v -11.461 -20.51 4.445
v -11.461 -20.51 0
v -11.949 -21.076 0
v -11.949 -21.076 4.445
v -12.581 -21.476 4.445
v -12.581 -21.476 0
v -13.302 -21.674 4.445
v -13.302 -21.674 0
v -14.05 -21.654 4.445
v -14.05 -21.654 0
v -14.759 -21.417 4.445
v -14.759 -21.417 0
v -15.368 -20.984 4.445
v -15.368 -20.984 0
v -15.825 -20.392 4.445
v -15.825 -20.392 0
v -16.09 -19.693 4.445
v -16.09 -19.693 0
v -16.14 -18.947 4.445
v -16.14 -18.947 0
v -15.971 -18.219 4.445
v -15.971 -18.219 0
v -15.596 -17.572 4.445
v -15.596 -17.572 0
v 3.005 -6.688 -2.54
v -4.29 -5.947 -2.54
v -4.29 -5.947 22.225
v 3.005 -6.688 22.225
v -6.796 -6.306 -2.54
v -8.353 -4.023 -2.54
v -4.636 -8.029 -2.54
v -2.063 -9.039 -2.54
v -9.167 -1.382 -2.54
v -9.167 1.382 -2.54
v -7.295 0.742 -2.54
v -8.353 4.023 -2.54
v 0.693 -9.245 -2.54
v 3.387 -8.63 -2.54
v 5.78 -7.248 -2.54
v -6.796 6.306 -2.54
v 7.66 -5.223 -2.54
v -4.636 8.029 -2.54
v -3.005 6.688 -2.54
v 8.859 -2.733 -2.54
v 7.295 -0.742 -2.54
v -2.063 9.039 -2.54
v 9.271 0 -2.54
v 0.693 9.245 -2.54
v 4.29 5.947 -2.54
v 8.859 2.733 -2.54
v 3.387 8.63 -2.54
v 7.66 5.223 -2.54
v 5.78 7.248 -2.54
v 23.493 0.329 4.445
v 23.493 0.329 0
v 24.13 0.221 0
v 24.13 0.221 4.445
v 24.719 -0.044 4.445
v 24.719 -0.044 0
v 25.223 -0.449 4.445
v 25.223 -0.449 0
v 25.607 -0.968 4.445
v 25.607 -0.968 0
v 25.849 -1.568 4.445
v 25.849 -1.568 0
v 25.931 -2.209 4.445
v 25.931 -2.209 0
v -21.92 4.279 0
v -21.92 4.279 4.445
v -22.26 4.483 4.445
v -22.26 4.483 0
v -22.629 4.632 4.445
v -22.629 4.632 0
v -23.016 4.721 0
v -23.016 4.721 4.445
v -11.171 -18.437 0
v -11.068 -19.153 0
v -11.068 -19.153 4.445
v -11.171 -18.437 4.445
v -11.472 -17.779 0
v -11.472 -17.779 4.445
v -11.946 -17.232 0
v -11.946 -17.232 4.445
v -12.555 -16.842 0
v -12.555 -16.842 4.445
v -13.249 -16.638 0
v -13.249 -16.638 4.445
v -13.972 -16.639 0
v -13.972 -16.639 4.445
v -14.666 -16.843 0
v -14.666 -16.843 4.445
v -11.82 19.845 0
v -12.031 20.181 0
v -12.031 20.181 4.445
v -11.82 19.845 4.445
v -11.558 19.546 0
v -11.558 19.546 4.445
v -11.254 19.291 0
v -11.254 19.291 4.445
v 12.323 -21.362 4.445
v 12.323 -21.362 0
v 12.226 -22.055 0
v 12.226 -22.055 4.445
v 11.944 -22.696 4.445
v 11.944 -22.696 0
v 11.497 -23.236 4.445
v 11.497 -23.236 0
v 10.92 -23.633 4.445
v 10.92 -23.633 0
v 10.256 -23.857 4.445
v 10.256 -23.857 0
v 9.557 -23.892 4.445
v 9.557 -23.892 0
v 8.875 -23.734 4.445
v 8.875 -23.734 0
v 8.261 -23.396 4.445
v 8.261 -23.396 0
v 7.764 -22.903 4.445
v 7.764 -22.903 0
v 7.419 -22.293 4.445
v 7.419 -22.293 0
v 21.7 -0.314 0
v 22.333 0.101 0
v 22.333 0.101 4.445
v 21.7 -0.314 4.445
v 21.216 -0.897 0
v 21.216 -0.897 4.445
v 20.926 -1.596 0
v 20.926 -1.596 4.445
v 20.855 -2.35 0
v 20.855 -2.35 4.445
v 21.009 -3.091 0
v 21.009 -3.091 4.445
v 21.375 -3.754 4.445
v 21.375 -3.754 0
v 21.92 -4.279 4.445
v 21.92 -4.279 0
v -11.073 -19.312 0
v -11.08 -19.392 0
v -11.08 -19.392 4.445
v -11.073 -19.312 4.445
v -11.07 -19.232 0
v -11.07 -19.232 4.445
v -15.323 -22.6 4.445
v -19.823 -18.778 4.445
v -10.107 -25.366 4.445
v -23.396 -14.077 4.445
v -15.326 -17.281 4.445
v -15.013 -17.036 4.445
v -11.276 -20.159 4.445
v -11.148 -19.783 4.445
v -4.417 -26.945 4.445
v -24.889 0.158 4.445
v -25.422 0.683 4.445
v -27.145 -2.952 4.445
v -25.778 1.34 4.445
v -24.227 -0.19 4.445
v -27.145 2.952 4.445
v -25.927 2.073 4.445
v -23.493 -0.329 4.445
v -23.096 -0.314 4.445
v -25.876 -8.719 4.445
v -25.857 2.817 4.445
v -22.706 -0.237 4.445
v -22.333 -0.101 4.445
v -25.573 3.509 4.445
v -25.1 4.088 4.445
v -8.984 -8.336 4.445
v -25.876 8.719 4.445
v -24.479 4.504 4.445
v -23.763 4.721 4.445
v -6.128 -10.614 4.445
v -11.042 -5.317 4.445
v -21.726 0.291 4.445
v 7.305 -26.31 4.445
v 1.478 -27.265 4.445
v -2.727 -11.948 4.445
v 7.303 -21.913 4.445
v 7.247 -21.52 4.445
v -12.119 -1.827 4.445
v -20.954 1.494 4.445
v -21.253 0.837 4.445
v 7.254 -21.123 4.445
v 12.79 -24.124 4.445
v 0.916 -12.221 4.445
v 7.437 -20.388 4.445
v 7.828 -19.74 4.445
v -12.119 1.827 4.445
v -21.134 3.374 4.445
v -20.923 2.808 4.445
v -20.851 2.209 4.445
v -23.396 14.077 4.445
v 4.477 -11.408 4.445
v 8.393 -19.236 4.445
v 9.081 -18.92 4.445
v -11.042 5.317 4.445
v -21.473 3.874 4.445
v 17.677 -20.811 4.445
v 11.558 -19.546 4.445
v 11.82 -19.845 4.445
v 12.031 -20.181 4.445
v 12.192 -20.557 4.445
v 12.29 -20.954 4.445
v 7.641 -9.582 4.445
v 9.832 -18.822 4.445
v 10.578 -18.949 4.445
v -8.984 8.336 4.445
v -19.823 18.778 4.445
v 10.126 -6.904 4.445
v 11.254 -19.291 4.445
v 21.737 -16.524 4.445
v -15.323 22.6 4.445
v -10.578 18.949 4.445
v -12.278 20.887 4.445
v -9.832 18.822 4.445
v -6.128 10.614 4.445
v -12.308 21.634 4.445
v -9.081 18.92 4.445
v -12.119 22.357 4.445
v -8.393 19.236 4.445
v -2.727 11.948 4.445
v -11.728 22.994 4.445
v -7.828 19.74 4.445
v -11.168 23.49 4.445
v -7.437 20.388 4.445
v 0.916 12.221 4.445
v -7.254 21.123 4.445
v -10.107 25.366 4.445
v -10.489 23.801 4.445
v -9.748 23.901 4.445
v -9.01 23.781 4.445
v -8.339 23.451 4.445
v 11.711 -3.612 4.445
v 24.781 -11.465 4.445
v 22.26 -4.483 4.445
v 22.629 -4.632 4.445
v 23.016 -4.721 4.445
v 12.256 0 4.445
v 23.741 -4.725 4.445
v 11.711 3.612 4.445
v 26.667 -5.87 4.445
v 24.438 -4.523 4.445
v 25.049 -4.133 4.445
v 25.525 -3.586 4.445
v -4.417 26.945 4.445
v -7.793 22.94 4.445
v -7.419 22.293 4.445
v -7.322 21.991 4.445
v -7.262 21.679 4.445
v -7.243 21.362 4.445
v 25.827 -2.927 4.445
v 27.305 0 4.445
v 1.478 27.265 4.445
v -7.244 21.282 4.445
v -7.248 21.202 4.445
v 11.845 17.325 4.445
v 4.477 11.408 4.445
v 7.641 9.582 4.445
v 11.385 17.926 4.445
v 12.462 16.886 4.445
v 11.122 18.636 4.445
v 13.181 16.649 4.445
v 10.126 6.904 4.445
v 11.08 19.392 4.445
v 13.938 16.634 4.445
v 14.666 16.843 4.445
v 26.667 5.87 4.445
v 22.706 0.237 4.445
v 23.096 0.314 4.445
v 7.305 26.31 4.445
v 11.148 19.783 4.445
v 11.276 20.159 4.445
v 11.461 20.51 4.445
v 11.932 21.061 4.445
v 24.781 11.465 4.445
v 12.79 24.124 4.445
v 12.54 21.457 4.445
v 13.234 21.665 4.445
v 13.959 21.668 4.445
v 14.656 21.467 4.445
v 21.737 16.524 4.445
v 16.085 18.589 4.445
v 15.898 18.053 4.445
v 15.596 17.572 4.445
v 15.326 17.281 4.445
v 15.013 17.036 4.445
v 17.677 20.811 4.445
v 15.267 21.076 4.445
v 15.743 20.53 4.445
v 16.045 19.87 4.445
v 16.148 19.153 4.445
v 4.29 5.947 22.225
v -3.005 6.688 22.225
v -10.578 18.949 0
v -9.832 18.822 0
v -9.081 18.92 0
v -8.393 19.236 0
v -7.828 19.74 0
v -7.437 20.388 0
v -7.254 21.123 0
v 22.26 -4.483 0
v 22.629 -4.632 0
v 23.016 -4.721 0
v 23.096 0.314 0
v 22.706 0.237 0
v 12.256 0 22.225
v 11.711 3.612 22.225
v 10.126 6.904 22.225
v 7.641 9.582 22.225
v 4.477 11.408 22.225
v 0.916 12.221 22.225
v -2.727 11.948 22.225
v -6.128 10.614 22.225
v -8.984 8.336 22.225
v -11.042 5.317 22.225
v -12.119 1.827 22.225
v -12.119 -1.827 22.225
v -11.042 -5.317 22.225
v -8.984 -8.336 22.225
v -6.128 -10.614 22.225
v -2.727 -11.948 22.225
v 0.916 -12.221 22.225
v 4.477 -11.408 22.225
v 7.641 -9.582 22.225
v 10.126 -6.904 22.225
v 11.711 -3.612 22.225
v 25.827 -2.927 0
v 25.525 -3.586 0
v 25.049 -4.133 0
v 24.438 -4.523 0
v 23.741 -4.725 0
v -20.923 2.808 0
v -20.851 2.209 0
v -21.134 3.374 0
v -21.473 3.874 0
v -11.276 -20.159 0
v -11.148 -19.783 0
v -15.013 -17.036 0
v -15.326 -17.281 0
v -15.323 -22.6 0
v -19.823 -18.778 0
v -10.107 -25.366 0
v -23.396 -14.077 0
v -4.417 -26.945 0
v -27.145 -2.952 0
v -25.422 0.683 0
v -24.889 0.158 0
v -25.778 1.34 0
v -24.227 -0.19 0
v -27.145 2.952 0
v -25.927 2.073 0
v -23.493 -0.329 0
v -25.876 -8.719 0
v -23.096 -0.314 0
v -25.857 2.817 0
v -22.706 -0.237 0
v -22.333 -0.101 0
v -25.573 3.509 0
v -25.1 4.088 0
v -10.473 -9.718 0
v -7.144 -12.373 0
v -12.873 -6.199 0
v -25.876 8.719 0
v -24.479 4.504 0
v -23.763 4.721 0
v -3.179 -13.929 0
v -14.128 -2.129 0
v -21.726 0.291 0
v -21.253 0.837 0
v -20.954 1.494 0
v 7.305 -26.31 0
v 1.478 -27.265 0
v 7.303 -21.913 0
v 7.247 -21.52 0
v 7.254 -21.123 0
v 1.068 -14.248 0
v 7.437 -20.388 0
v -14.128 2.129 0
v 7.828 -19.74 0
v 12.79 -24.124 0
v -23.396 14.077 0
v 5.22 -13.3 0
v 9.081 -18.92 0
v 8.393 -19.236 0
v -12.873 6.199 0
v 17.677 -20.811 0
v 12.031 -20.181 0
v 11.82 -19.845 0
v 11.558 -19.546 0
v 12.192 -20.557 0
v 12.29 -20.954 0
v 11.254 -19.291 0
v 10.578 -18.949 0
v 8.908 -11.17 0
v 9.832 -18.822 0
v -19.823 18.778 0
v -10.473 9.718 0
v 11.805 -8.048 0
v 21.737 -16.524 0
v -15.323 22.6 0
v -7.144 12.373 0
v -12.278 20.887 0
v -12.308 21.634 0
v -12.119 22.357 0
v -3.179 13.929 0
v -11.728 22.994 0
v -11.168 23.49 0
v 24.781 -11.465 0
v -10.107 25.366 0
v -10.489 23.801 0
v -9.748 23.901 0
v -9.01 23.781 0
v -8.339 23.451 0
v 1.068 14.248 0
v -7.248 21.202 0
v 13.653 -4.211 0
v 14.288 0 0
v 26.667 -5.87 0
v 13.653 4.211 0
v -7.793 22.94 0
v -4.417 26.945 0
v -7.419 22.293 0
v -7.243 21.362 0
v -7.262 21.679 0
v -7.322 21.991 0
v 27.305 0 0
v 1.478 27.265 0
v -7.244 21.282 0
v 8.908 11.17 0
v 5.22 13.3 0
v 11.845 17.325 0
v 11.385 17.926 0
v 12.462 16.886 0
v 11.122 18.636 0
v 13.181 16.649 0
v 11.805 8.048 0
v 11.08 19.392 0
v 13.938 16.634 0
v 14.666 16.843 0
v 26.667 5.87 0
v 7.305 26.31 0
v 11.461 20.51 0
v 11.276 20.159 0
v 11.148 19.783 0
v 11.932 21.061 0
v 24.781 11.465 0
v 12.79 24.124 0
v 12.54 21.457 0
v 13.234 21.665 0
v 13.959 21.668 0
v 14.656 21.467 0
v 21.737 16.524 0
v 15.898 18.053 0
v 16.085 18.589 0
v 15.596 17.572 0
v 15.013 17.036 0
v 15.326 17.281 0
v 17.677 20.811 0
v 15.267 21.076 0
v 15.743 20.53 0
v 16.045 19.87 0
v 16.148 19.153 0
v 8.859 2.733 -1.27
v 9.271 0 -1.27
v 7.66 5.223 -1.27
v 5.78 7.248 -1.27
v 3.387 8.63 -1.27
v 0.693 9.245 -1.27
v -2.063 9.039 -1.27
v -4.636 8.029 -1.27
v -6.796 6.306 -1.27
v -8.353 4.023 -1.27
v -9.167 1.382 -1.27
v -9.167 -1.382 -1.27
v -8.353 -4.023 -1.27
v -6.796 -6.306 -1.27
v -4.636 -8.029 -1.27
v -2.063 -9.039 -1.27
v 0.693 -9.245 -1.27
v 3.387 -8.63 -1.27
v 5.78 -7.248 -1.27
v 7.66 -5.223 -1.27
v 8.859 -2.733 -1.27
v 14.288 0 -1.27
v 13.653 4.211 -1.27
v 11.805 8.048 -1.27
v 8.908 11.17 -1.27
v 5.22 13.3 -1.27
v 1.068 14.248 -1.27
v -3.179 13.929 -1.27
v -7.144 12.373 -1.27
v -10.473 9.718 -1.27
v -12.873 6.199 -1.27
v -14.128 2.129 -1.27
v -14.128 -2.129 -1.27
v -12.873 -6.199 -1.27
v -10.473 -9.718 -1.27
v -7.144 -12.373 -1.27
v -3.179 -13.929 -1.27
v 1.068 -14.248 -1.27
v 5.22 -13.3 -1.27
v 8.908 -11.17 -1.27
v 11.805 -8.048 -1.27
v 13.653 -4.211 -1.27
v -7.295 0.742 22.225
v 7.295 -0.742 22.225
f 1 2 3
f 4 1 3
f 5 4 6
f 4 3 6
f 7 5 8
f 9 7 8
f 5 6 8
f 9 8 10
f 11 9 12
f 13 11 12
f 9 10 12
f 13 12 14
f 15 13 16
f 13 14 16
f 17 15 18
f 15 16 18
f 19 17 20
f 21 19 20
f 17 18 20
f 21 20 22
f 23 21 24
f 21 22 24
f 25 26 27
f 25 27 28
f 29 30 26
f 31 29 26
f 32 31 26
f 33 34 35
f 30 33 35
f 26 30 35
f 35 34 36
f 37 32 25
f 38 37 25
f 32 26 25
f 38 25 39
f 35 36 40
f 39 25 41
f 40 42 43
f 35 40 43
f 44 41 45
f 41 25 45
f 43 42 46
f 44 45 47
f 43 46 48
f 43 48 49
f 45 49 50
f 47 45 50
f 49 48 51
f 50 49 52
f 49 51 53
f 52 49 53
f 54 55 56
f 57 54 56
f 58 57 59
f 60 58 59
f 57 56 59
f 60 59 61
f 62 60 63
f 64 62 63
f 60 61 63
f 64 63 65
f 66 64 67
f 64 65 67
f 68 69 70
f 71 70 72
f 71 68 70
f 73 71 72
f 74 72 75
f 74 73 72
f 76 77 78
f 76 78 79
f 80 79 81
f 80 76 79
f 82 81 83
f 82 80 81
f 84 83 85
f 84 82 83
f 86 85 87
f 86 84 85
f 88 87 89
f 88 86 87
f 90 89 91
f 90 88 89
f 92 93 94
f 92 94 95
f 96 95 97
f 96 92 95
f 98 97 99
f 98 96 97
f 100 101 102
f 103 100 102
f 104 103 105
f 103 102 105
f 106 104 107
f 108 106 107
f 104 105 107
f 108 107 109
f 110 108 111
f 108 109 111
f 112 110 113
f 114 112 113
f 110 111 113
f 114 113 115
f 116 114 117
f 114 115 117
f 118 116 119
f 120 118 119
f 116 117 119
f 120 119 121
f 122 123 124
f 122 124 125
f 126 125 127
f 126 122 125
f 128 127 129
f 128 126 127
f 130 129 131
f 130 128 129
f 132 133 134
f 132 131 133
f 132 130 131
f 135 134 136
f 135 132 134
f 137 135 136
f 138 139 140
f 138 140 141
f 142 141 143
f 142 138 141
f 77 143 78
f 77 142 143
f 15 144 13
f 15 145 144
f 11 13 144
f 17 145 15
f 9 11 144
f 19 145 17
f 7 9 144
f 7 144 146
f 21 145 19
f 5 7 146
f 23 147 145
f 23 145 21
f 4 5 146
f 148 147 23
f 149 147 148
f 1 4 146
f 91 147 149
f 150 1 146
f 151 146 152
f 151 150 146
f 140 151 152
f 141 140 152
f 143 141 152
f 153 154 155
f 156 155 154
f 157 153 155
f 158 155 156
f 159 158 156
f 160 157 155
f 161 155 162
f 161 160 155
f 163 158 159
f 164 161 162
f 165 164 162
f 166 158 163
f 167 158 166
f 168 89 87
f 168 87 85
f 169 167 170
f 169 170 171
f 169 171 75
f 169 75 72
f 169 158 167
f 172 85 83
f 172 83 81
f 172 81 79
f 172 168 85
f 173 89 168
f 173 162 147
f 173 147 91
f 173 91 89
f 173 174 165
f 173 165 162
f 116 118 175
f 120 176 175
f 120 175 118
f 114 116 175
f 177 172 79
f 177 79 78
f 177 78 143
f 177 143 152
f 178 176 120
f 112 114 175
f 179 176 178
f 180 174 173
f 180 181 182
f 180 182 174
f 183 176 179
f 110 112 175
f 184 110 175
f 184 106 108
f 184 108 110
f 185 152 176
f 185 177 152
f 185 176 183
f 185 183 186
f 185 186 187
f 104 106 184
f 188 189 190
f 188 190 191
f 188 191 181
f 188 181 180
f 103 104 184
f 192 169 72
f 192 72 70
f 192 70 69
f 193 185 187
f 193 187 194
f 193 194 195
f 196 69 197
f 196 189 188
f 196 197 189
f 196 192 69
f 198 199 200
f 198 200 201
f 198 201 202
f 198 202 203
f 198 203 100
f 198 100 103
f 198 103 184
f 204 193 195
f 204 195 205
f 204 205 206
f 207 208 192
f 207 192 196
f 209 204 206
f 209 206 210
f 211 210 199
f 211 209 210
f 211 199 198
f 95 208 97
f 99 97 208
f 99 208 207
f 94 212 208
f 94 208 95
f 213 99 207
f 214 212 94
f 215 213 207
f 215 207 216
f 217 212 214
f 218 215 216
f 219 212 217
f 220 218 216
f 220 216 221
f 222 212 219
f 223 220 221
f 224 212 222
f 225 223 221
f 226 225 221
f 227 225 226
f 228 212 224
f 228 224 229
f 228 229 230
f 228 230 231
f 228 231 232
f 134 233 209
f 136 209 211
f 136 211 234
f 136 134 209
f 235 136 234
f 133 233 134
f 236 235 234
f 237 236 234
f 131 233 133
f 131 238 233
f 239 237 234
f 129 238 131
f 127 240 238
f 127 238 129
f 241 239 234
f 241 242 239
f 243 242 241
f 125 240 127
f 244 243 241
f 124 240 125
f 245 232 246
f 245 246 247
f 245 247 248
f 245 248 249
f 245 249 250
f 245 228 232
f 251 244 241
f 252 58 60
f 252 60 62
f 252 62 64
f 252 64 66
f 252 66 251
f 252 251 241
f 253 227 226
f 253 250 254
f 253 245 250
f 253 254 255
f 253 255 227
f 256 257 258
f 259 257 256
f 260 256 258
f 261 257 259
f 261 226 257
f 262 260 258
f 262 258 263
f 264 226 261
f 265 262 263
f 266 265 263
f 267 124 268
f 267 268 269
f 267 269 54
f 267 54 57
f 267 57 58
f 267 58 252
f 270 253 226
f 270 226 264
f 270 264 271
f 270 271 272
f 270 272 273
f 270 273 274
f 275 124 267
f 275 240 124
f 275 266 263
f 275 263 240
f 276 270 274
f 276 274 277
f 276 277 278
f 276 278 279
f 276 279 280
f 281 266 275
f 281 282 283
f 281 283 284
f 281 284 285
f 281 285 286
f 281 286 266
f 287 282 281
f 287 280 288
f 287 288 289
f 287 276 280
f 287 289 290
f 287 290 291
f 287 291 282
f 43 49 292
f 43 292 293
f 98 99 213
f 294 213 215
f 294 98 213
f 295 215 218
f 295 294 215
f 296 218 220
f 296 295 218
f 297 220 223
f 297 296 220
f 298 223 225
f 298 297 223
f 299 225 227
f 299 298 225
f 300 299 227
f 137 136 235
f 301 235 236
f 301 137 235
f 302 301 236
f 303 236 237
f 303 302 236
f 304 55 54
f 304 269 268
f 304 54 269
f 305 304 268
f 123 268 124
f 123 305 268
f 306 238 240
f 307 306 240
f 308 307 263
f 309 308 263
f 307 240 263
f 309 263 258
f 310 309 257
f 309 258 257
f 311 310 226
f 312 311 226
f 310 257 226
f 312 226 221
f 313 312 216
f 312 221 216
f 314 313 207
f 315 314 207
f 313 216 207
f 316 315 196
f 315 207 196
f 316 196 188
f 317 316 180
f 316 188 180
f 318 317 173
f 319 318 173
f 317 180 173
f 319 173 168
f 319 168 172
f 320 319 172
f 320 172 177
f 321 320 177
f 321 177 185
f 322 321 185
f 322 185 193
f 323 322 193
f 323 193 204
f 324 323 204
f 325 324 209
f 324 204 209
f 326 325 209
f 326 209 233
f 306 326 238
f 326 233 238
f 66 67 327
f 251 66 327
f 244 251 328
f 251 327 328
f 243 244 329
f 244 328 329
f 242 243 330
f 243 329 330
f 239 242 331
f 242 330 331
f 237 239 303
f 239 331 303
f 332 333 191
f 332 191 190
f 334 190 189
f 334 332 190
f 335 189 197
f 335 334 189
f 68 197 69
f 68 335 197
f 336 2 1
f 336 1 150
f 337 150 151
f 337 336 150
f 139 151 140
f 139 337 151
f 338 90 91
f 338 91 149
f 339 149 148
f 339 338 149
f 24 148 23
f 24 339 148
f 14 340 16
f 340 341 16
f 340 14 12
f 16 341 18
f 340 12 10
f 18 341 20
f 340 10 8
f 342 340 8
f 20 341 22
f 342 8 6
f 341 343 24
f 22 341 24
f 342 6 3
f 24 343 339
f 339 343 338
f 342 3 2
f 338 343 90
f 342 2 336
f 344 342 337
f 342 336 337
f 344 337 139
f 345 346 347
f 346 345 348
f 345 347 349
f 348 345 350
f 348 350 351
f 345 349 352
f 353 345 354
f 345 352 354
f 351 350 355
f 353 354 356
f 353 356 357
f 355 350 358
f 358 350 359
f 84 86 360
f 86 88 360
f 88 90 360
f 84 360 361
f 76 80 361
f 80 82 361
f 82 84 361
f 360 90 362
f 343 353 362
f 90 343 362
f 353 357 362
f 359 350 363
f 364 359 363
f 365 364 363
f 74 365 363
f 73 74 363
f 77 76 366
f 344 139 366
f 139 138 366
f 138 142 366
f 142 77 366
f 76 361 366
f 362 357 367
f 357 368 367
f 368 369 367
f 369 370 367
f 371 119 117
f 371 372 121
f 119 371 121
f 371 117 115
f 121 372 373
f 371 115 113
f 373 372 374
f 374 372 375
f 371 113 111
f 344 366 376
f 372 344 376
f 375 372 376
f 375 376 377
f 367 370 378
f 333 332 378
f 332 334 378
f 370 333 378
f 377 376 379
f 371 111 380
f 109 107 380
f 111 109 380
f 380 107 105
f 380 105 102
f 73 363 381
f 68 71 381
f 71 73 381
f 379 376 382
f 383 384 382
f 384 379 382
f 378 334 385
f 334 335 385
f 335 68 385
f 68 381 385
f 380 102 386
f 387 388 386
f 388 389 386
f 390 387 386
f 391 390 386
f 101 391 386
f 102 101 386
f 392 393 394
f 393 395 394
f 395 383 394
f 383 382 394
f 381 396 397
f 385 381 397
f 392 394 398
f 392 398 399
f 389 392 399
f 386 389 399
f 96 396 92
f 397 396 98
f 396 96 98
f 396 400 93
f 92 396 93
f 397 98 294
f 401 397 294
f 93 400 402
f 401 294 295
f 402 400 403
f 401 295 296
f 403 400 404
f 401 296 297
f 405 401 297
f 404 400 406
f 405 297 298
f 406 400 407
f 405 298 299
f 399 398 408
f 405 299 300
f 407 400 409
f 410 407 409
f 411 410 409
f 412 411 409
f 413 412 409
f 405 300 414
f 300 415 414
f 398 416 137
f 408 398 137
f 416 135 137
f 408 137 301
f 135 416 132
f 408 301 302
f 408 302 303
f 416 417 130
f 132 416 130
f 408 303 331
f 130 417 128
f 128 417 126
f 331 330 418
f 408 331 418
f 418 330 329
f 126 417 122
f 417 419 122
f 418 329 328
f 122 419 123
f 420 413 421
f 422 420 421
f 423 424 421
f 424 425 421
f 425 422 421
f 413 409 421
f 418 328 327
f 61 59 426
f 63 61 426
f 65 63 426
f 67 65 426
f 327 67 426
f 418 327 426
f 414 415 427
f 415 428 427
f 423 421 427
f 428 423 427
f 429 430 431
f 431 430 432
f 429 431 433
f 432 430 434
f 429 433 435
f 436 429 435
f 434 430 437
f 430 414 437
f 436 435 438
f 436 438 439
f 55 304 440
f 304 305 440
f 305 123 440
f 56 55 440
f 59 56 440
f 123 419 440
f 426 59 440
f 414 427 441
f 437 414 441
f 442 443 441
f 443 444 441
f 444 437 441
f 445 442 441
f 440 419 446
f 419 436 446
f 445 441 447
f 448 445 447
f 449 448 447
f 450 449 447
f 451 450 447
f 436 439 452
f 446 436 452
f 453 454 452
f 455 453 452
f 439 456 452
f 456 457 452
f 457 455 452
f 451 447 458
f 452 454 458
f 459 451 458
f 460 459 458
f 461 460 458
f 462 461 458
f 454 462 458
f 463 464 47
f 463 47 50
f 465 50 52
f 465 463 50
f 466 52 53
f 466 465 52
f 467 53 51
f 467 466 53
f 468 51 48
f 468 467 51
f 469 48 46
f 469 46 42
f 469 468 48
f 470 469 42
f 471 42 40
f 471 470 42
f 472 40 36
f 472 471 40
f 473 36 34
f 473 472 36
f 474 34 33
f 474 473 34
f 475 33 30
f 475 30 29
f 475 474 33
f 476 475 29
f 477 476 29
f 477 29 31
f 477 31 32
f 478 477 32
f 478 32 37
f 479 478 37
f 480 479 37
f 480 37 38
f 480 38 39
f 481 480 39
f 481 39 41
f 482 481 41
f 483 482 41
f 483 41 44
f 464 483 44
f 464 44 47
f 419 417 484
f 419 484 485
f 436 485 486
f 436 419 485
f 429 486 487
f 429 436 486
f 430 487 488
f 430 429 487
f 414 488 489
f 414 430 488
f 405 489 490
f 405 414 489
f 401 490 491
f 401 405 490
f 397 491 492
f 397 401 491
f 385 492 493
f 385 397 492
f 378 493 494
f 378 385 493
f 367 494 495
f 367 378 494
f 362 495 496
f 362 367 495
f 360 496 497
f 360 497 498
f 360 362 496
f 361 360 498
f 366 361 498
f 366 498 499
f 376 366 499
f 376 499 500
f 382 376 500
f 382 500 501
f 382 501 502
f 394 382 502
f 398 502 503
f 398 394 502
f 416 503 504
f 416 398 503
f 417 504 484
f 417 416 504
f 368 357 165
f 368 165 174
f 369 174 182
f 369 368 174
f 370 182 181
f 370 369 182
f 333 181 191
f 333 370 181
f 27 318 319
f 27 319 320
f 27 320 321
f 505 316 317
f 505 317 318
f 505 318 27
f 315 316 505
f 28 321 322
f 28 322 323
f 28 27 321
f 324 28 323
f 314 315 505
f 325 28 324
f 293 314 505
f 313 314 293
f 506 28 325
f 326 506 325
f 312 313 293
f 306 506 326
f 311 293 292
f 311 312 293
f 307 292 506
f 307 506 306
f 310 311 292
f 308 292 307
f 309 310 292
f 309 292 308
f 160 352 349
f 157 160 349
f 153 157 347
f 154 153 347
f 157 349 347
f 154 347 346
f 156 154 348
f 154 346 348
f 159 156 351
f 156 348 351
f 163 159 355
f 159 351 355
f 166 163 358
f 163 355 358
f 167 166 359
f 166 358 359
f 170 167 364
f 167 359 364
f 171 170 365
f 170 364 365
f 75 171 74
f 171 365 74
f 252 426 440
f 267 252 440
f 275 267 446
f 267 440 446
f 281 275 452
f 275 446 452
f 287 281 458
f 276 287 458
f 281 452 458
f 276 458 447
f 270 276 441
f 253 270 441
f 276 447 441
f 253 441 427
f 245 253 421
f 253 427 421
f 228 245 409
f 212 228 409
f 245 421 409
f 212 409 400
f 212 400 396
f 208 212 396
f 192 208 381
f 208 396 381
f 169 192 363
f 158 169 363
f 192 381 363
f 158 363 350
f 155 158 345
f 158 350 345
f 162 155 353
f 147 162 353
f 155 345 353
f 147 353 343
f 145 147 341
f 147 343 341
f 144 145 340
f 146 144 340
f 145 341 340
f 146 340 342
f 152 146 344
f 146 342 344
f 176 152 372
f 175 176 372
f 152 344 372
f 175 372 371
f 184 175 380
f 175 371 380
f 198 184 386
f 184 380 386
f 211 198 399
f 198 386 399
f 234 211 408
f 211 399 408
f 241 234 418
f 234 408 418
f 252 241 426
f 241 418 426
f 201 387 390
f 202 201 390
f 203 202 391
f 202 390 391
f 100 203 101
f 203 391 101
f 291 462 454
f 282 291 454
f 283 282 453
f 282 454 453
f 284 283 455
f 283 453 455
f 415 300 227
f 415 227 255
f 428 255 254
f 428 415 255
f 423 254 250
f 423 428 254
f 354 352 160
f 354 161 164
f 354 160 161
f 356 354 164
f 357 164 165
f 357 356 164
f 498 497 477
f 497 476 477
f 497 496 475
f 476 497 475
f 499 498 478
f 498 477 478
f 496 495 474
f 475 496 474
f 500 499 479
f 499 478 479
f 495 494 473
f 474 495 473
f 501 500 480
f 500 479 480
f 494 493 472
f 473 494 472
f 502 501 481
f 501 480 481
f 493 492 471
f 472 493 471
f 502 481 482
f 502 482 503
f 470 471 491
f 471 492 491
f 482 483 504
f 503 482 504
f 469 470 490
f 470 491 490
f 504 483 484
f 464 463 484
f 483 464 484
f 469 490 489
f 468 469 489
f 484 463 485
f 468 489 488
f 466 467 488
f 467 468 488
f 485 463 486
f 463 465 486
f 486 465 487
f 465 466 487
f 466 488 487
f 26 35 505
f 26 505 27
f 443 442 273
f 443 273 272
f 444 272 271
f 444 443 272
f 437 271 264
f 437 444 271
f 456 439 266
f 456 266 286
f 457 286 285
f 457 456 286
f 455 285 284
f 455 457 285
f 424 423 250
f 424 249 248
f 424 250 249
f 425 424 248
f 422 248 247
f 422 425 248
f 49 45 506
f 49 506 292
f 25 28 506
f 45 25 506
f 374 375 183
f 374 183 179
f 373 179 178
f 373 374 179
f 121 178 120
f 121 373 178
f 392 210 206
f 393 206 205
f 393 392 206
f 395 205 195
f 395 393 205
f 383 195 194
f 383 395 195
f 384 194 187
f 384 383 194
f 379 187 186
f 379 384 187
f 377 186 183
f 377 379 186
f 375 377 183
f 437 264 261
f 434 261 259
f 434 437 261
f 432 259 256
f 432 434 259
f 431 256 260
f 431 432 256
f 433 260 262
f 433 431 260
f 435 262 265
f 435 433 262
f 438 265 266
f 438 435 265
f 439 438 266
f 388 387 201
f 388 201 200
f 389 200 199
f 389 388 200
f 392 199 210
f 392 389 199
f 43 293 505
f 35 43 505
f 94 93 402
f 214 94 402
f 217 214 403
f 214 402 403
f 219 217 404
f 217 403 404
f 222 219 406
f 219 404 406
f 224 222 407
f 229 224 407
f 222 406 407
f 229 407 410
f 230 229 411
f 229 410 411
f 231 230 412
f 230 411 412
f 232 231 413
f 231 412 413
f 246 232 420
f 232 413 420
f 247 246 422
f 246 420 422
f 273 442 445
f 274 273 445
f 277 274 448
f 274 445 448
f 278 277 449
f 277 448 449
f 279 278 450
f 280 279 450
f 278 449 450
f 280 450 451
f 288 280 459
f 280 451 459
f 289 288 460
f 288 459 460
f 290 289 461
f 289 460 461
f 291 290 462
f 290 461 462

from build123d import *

# Parameters (mm, degrees)
F0_R     = 27.305
F0_R_2   = 14.2875
F0_R_3   = 9.271
F1_DEPTH = 4.445
F2_R     = 12.2555
F3_DEPTH = 17.78
F4_DEPTH = 2.54
F5_DEPTH = 1.27
F7_DEPTH = 25.4
F8_DEPTH = 25.4


# Not quite as in the source:
# - a feature names something its author has since deleted; it is built from what else it names


with BuildPart() as f1:
    # F0 (on Top) → F1 (new body)
    with BuildSketch(Plane.XY):
        Circle(F0_R)
        with BuildLine():
            ThreePointArc((25.93093901, -2.2088452252), (25.0490643413, -4.1329607067), (23.015804848, -4.7209905953))
            ThreePointArc((23.015804848, -4.7209905953), (19.1527247884, -13.6083855831), (12.0313699631, -20.180712619))
            ThreePointArc((12.0313699631, -20.180712619), (12.2486833913, -20.753455716), (12.3225534269, -21.3615700137))
            ThreePointArc((12.3225534269, -21.3615700137), (10.2564743458, -23.856965566), (7.4194046374, -22.2927669845))
            ThreePointArc((7.4194046374, -22.2927669845), (-2.2088452252, -23.39093901), (-11.461324813, -20.5098283399))
            ThreePointArc((-11.461324813, -20.5098283399), (-15.0795624029, -21.2232896304), (-15.5964002105, -17.5717763892))
            ThreePointArc((-15.5964002105, -17.5717763892), (-21.3615700137, -9.7825534269), (-23.4926947761, -0.3291157209))
            ThreePointArc((-23.4926947761, -0.3291157209), (-25.9196891733, 2.4476393036), (-23.015804848, 4.7209905953))
            ThreePointArc((-23.015804848, 4.7209905953), (-19.1527247884, 13.6083855831), (-12.0313699631, 20.180712619))
            ThreePointArc((-12.0313699631, 20.180712619), (-10.8401267704, 23.6709289341), (-7.4194046374, 22.2927669845))
            ThreePointArc((-7.4194046374, 22.2927669845), (2.2088452252, 23.39093901), (11.461324813, 20.5098283399))
            ThreePointArc((11.461324813, 20.5098283399), (14.3148081351, 21.5925131354), (16.1483855831, 19.1527247884))
            ThreePointArc((16.1483855831, 19.1527247884), (16.0064219833, 18.3154545673), (15.5964002105, 17.5717763892))
            ThreePointArc((15.5964002105, 17.5717763892), (21.3615700137, 9.7825534269), (23.4926947761, 0.3291157209))
            ThreePointArc((23.4926947761, 0.3291157209), (25.2226130593, -0.4491378129), (25.93093901, -2.2088452252))
        make_face(mode=Mode.SUBTRACT)
        with BuildLine():
            ThreePointArc((21.9197621902, -4.2794100672), (20.8621888468, -1.9700511468), (22.3333656666, 0.1005136952))
            Line((22.3333656666, 0.1005136952), (14.6659589265, 16.843365868))
            ThreePointArc((14.6659589265, 16.843365868), (12.1372087633, 17.0821599464), (11.0796354198, 19.3915188668))
            Line((11.0796354198, 19.3915188668), (-7.2538032637, 21.1227759353))
            ThreePointArc((-7.2538032637, 21.1227759353), (-8.7249800835, 19.0522110933), (-11.2537302467, 19.2910051717))
            Line((-11.2537302467, 19.2910051717), (-21.9197621902, 4.2794100672))
            ThreePointArc((-21.9197621902, 4.2794100672), (-21.1339067637, 3.3739226642), (-20.85093901, 2.2088452252))
            ThreePointArc((-20.85093901, 2.2088452252), (-21.2534362273, 0.8367366822), (-22.3333656666, -0.1005136952))
            Line((-22.3333656666, -0.1005136952), (-14.6659589265, -16.843365868))
            ThreePointArc((-14.6659589265, -16.843365868), (-12.2362770401, -17.0152220057), (-11.0683855831, -19.1527247884))
            ThreePointArc((-11.0683855831, -19.1527247884), (-11.0711996011, -19.2722542521), (-11.0796354198, -19.3915188668))
            Line((-11.0796354198, -19.3915188668), (7.2538032637, -21.1227759353))
            ThreePointArc((7.2538032637, -21.1227759353), (8.7249800835, -19.0522110933), (11.2537302467, -19.2910051717))
            Line((11.2537302467, -19.2910051717), (21.9197621902, -4.2794100672))
        make_face()
        Circle(F0_R_2, mode=Mode.SUBTRACT)
        Circle(F0_R_2)
        Circle(F0_R_3, mode=Mode.SUBTRACT)
        Circle(F0_R_3)
        with BuildLine():
            Line((14.6659589265, 16.843365868), (22.3333656666, 0.1005136952))
            ThreePointArc((22.3333656666, 0.1005136952), (22.8995516558, 0.2831697162), (23.4926947761, 0.3291157209))
            ThreePointArc((23.4926947761, 0.3291157209), (21.3615700137, 9.7825534269), (15.5964002105, 17.5717763892))
            ThreePointArc((15.5964002105, 17.5717763892), (15.1741272585, 17.152711537), (14.6659589265, 16.843365868))
        make_face()
        with BuildLine():
            Line((-7.2538032637, 21.1227759353), (11.0796354198, 19.3915188668))
            ThreePointArc((11.0796354198, 19.3915188668), (11.2045436601, 19.9731783273), (11.461324813, 20.5098283399))
            ThreePointArc((11.461324813, 20.5098283399), (2.2088452252, 23.39093901), (-7.4194046374, 22.2927669845))
            ThreePointArc((-7.4194046374, 22.2927669845), (-7.2871578746, 21.8354909325), (-7.2425534269, 21.3615700137))
            ThreePointArc((-7.2425534269, 21.3615700137), (-7.2453674449, 21.24204055), (-7.2538032637, 21.1227759353))
        make_face()
        with BuildLine():
            Line((-21.9197621902, 4.2794100672), (-11.2537302467, 19.2910051717))
            ThreePointArc((-11.2537302467, 19.2910051717), (-11.6950079957, 19.6900086111), (-12.0313699631, 20.180712619))
            ThreePointArc((-12.0313699631, 20.180712619), (-19.1527247884, 13.6083855831), (-23.015804848, 4.7209905953))
            ThreePointArc((-23.015804848, 4.7209905953), (-22.441747564, 4.5648239176), (-21.9197621902, 4.2794100672))
        make_face()
        with BuildLine():
            ThreePointArc((-23.4926947761, -0.3291157209), (-21.3615700137, -9.7825534269), (-15.5964002105, -17.5717763892))
            ThreePointArc((-15.5964002105, -17.5717763892), (-15.1741272585, -17.152711537), (-14.6659589265, -16.843365868))
            Line((-14.6659589265, -16.843365868), (-22.3333656666, -0.1005136952))
            ThreePointArc((-22.3333656666, -0.1005136952), (-22.8995516558, -0.2831697162), (-23.4926947761, -0.3291157209))
        make_face()
        with BuildLine():
            ThreePointArc((7.4194046374, -22.2927669845), (7.2676203056, -21.7175354546), (7.2538032637, -21.1227759353))
            Line((7.2538032637, -21.1227759353), (-11.0796354198, -19.3915188668))
            ThreePointArc((-11.0796354198, -19.3915188668), (-11.2045436601, -19.9731783273), (-11.461324813, -20.5098283399))
            ThreePointArc((-11.461324813, -20.5098283399), (-2.2088452252, -23.39093901), (7.4194046374, -22.2927669845))
        make_face()
        with BuildLine():
            ThreePointArc((12.0313699631, -20.180712619), (19.1527247884, -13.6083855831), (23.015804848, -4.7209905953))
            ThreePointArc((23.015804848, -4.7209905953), (22.441747564, -4.5648239176), (21.9197621902, -4.2794100672))
            Line((21.9197621902, -4.2794100672), (11.2537302467, -19.2910051717))
            ThreePointArc((11.2537302467, -19.2910051717), (11.6950079957, -19.6900086111), (12.0313699631, -20.180712619))
        make_face()
        with BuildLine():
            ThreePointArc((-11.2537302467, 19.2910051717), (-8.7249800835, 19.0522110933), (-7.2538032637, 21.1227759353))
            Line((-7.2538032637, 21.1227759353), (-9.7825534269, 21.3615700137))
            Line((-9.7825534269, 21.3615700137), (-11.2537302467, 19.2910051717))
        make_face()
        with BuildLine():
            ThreePointArc((-20.85093901, 2.2088452252), (-21.1339067637, 3.3739226642), (-21.9197621902, 4.2794100672))
            Line((-21.9197621902, 4.2794100672), (-23.39093901, 2.2088452252))
            Line((-23.39093901, 2.2088452252), (-22.3333656666, -0.1005136952))
            ThreePointArc((-22.3333656666, -0.1005136952), (-21.2534362273, 0.8367366822), (-20.85093901, 2.2088452252))
        make_face()
        with BuildLine():
            Line((-13.6083855831, -19.1527247884), (-11.0796354198, -19.3915188668))
            ThreePointArc((-11.0796354198, -19.3915188668), (-11.0711996011, -19.2722542521), (-11.0683855831, -19.1527247884))
            ThreePointArc((-11.0683855831, -19.1527247884), (-12.2362770401, -17.0152220057), (-14.6659589265, -16.843365868))
            Line((-14.6659589265, -16.843365868), (-13.6083855831, -19.1527247884))
        make_face()
        with BuildLine():
            Line((9.7825534269, -21.3615700137), (11.2537302467, -19.2910051717))
            ThreePointArc((11.2537302467, -19.2910051717), (8.7249800835, -19.0522110933), (7.2538032637, -21.1227759353))
            Line((7.2538032637, -21.1227759353), (9.7825534269, -21.3615700137))
        make_face()
        with BuildLine():
            Line((21.9197621902, -4.2794100672), (23.39093901, -2.2088452252))
            Line((23.39093901, -2.2088452252), (22.3333656666, 0.1005136952))
            ThreePointArc((22.3333656666, 0.1005136952), (20.8621888468, -1.9700511468), (21.9197621902, -4.2794100672))
        make_face()
        with BuildLine():
            ThreePointArc((11.0796354198, 19.3915188668), (12.1372087633, 17.0821599464), (14.6659589265, 16.843365868))
            Line((14.6659589265, 16.843365868), (13.6083855831, 19.1527247884))
            Line((13.6083855831, 19.1527247884), (11.0796354198, 19.3915188668))
        make_face()
        with BuildLine():
            Line((13.6083855831, 19.1527247884), (14.6659589265, 16.843365868))
            ThreePointArc((14.6659589265, 16.843365868), (15.1741272585, 17.152711537), (15.5964002105, 17.5717763892))
            ThreePointArc((15.5964002105, 17.5717763892), (14.6237726929, 18.3891353039), (13.6083855831, 19.1527247884))
        make_face()
        with BuildLine():
            Line((11.0796354198, 19.3915188668), (13.6083855831, 19.1527247884))
            ThreePointArc((13.6083855831, 19.1527247884), (12.5532078509, 19.8603121237), (11.461324813, 20.5098283399))
            ThreePointArc((11.461324813, 20.5098283399), (11.2045436601, 19.9731783273), (11.0796354198, 19.3915188668))
        make_face()
        with BuildLine():
            Line((-9.7825534269, 21.3615700137), (-7.2538032637, 21.1227759353))
            ThreePointArc((-7.2538032637, 21.1227759353), (-7.2453674449, 21.24204055), (-7.2425534269, 21.3615700137))
            ThreePointArc((-7.2425534269, 21.3615700137), (-7.2871578746, 21.8354909325), (-7.4194046374, 22.2927669845))
            ThreePointArc((-7.4194046374, 22.2927669845), (-8.6135719804, 21.8591263032), (-9.7825534269, 21.3615700137))
        make_face()
        with BuildLine():
            Line((-11.2537302467, 19.2910051717), (-9.7825534269, 21.3615700137))
            ThreePointArc((-9.7825534269, 21.3615700137), (-10.9229309008, 20.8015529597), (-12.0313699631, 20.180712619))
            ThreePointArc((-12.0313699631, 20.180712619), (-11.6950079957, 19.6900086111), (-11.2537302467, 19.2910051717))
        make_face()
        with BuildLine():
            Line((-23.39093901, 2.2088452252), (-21.9197621902, 4.2794100672))
            ThreePointArc((-21.9197621902, 4.2794100672), (-22.441747564, 4.5648239176), (-23.015804848, 4.7209905953))
            ThreePointArc((-23.015804848, 4.7209905953), (-23.2373446733, 3.4699909992), (-23.39093901, 2.2088452252))
        make_face()
        with BuildLine():
            ThreePointArc((-23.39093901, 2.2088452252), (-23.4761387517, 0.941240836), (-23.4926947761, -0.3291157209))
            ThreePointArc((-23.4926947761, -0.3291157209), (-22.8995516558, -0.2831697162), (-22.3333656666, -0.1005136952))
            Line((-22.3333656666, -0.1005136952), (-23.39093901, 2.2088452252))
        make_face()
        with BuildLine():
            ThreePointArc((-15.5964002105, -17.5717763892), (-14.6237726929, -18.3891353039), (-13.6083855831, -19.1527247884))
            Line((-13.6083855831, -19.1527247884), (-14.6659589265, -16.843365868))
            ThreePointArc((-14.6659589265, -16.843365868), (-15.1741272585, -17.152711537), (-15.5964002105, -17.5717763892))
        make_face()
        with BuildLine():
            ThreePointArc((-11.461324813, -20.5098283399), (-11.2045436601, -19.9731783273), (-11.0796354198, -19.3915188668))
            Line((-11.0796354198, -19.3915188668), (-13.6083855831, -19.1527247884))
            ThreePointArc((-13.6083855831, -19.1527247884), (-12.5532078509, -19.8603121237), (-11.461324813, -20.5098283399))
        make_face()
        with BuildLine():
            ThreePointArc((7.4194046374, -22.2927669845), (8.6135719804, -21.8591263032), (9.7825534269, -21.3615700137))
            Line((9.7825534269, -21.3615700137), (7.2538032637, -21.1227759353))
            ThreePointArc((7.2538032637, -21.1227759353), (7.2676203056, -21.7175354546), (7.4194046374, -22.2927669845))
        make_face()
        with BuildLine():
            ThreePointArc((9.7825534269, -21.3615700137), (10.9229309008, -20.8015529597), (12.0313699631, -20.180712619))
            ThreePointArc((12.0313699631, -20.180712619), (11.6950079957, -19.6900086111), (11.2537302467, -19.2910051717))
            Line((11.2537302467, -19.2910051717), (9.7825534269, -21.3615700137))
        make_face()
        with BuildLine():
            ThreePointArc((23.015804848, -4.7209905953), (23.2373446733, -3.4699909992), (23.39093901, -2.2088452252))
            Line((23.39093901, -2.2088452252), (21.9197621902, -4.2794100672))
            ThreePointArc((21.9197621902, -4.2794100672), (22.441747564, -4.5648239176), (23.015804848, -4.7209905953))
        make_face()
        with BuildLine():
            Line((22.3333656666, 0.1005136952), (23.39093901, -2.2088452252))
            ThreePointArc((23.39093901, -2.2088452252), (23.4689703336, -1.1056475386), (23.495, 0))
            ThreePointArc((23.495, 0), (23.494423687, 0.164561897), (23.4926947761, 0.3291157209))
            ThreePointArc((23.4926947761, 0.3291157209), (22.8995516558, 0.2831697162), (22.3333656666, 0.1005136952))
        make_face()
    extrude(amount=F1_DEPTH)

    # F2 (on face) → F3 (join)
    with BuildSketch(Plane.XY.offset(4.445)):
        Circle(F2_R)
    extrude(amount=F3_DEPTH)

    # F0 (on Top) → F4 (join)
    with BuildSketch(Plane.XY):
        Circle(F0_R_3)
    extrude(amount=-F4_DEPTH)

    # F0 (on Top) → F5 (join)
    with BuildSketch(Plane.XY):
        Circle(F0_R_2)
        Circle(F0_R_3, mode=Mode.SUBTRACT)
    extrude(amount=-F5_DEPTH)

    # F6 (on face) → F7 (cut)
    with BuildSketch(Plane.XY.offset(22.225)):
        Polygon((-4.2897580502, -5.9465375811), (3.0049735847, -6.6883082382), (7.2947316349, -0.741770657), (4.2897580502, 5.9465375811), (-3.0049735847, 6.6883082382), (-7.2947316349, 0.741770657), align=None)
    extrude(amount=-F7_DEPTH, mode=Mode.SUBTRACT)

    # F0 (on Top) → F8 (cut)
    with BuildSketch(Plane.XY):
        with BuildLine():
            ThreePointArc((11.0796354198, 19.3915188668), (12.1372087633, 17.0821599464), (14.6659589265, 16.843365868))
            Line((14.6659589265, 16.843365868), (13.6083855831, 19.1527247884))
            Line((13.6083855831, 19.1527247884), (11.0796354198, 19.3915188668))
        make_face()
        with BuildLine():
            Line((13.6083855831, 19.1527247884), (14.6659589265, 16.843365868))
            ThreePointArc((14.6659589265, 16.843365868), (15.1741272585, 17.152711537), (15.5964002105, 17.5717763892))
            ThreePointArc((15.5964002105, 17.5717763892), (14.6237726929, 18.3891353039), (13.6083855831, 19.1527247884))
        make_face()
        with BuildLine():
            Line((11.0796354198, 19.3915188668), (13.6083855831, 19.1527247884))
            ThreePointArc((13.6083855831, 19.1527247884), (12.5532078509, 19.8603121237), (11.461324813, 20.5098283399))
            ThreePointArc((11.461324813, 20.5098283399), (11.2045436601, 19.9731783273), (11.0796354198, 19.3915188668))
        make_face()
        with BuildLine():
            Line((-23.39093901, 2.2088452252), (-21.9197621902, 4.2794100672))
            ThreePointArc((-21.9197621902, 4.2794100672), (-22.441747564, 4.5648239176), (-23.015804848, 4.7209905953))
            ThreePointArc((-23.015804848, 4.7209905953), (-23.2373446733, 3.4699909992), (-23.39093901, 2.2088452252))
        make_face()
        with BuildLine():
            ThreePointArc((-20.85093901, 2.2088452252), (-21.1339067637, 3.3739226642), (-21.9197621902, 4.2794100672))
            Line((-21.9197621902, 4.2794100672), (-23.39093901, 2.2088452252))
            Line((-23.39093901, 2.2088452252), (-22.3333656666, -0.1005136952))
            ThreePointArc((-22.3333656666, -0.1005136952), (-21.2534362273, 0.8367366822), (-20.85093901, 2.2088452252))
        make_face()
        with BuildLine():
            ThreePointArc((-23.39093901, 2.2088452252), (-23.4761387517, 0.941240836), (-23.4926947761, -0.3291157209))
            ThreePointArc((-23.4926947761, -0.3291157209), (-22.8995516558, -0.2831697162), (-22.3333656666, -0.1005136952))
            Line((-22.3333656666, -0.1005136952), (-23.39093901, 2.2088452252))
        make_face()
        with BuildLine():
            Line((-11.2537302467, 19.2910051717), (-9.7825534269, 21.3615700137))
            ThreePointArc((-9.7825534269, 21.3615700137), (-10.9229309008, 20.8015529597), (-12.0313699631, 20.180712619))
            ThreePointArc((-12.0313699631, 20.180712619), (-11.6950079957, 19.6900086111), (-11.2537302467, 19.2910051717))
        make_face()
        with BuildLine():
            ThreePointArc((-11.2537302467, 19.2910051717), (-8.7249800835, 19.0522110933), (-7.2538032637, 21.1227759353))
            Line((-7.2538032637, 21.1227759353), (-9.7825534269, 21.3615700137))
            Line((-9.7825534269, 21.3615700137), (-11.2537302467, 19.2910051717))
        make_face()
        with BuildLine():
            Line((-9.7825534269, 21.3615700137), (-7.2538032637, 21.1227759353))
            ThreePointArc((-7.2538032637, 21.1227759353), (-7.2453674449, 21.24204055), (-7.2425534269, 21.3615700137))
            ThreePointArc((-7.2425534269, 21.3615700137), (-7.2871578746, 21.8354909325), (-7.4194046374, 22.2927669845))
            ThreePointArc((-7.4194046374, 22.2927669845), (-8.6135719804, 21.8591263032), (-9.7825534269, 21.3615700137))
        make_face()
        with BuildLine():
            Line((-13.6083855831, -19.1527247884), (-11.0796354198, -19.3915188668))
            ThreePointArc((-11.0796354198, -19.3915188668), (-11.0711996011, -19.2722542521), (-11.0683855831, -19.1527247884))
            ThreePointArc((-11.0683855831, -19.1527247884), (-12.2362770401, -17.0152220057), (-14.6659589265, -16.843365868))
            Line((-14.6659589265, -16.843365868), (-13.6083855831, -19.1527247884))
        make_face()
        with BuildLine():
            ThreePointArc((-11.461324813, -20.5098283399), (-11.2045436601, -19.9731783273), (-11.0796354198, -19.3915188668))
            Line((-11.0796354198, -19.3915188668), (-13.6083855831, -19.1527247884))
            ThreePointArc((-13.6083855831, -19.1527247884), (-12.5532078509, -19.8603121237), (-11.461324813, -20.5098283399))
        make_face()
        with BuildLine():
            ThreePointArc((-15.5964002105, -17.5717763892), (-14.6237726929, -18.3891353039), (-13.6083855831, -19.1527247884))
            Line((-13.6083855831, -19.1527247884), (-14.6659589265, -16.843365868))
            ThreePointArc((-14.6659589265, -16.843365868), (-15.1741272585, -17.152711537), (-15.5964002105, -17.5717763892))
        make_face()
        with BuildLine():
            Line((9.7825534269, -21.3615700137), (11.2537302467, -19.2910051717))
            ThreePointArc((11.2537302467, -19.2910051717), (8.7249800835, -19.0522110933), (7.2538032637, -21.1227759353))
            Line((7.2538032637, -21.1227759353), (9.7825534269, -21.3615700137))
        make_face()
        with BuildLine():
            ThreePointArc((7.4194046374, -22.2927669845), (8.6135719804, -21.8591263032), (9.7825534269, -21.3615700137))
            Line((9.7825534269, -21.3615700137), (7.2538032637, -21.1227759353))
            ThreePointArc((7.2538032637, -21.1227759353), (7.2676203056, -21.7175354546), (7.4194046374, -22.2927669845))
        make_face()
        with BuildLine():
            ThreePointArc((9.7825534269, -21.3615700137), (10.9229309008, -20.8015529597), (12.0313699631, -20.180712619))
            ThreePointArc((12.0313699631, -20.180712619), (11.6950079957, -19.6900086111), (11.2537302467, -19.2910051717))
            Line((11.2537302467, -19.2910051717), (9.7825534269, -21.3615700137))
        make_face()
        with BuildLine():
            Line((21.9197621902, -4.2794100672), (23.39093901, -2.2088452252))
            Line((23.39093901, -2.2088452252), (22.3333656666, 0.1005136952))
            ThreePointArc((22.3333656666, 0.1005136952), (20.8621888468, -1.9700511468), (21.9197621902, -4.2794100672))
        make_face()
        with BuildLine():
            Line((22.3333656666, 0.1005136952), (23.39093901, -2.2088452252))
            ThreePointArc((23.39093901, -2.2088452252), (23.4689703336, -1.1056475386), (23.495, 0))
            ThreePointArc((23.495, 0), (23.494423687, 0.164561897), (23.4926947761, 0.3291157209))
            ThreePointArc((23.4926947761, 0.3291157209), (22.8995516558, 0.2831697162), (22.3333656666, 0.1005136952))
        make_face()
        with BuildLine():
            ThreePointArc((23.015804848, -4.7209905953), (23.2373446733, -3.4699909992), (23.39093901, -2.2088452252))
            Line((23.39093901, -2.2088452252), (21.9197621902, -4.2794100672))
            ThreePointArc((21.9197621902, -4.2794100672), (22.441747564, -4.5648239176), (23.015804848, -4.7209905953))
        make_face()
    extrude(amount=F8_DEPTH, mode=Mode.SUBTRACT)


solid = f1.part
